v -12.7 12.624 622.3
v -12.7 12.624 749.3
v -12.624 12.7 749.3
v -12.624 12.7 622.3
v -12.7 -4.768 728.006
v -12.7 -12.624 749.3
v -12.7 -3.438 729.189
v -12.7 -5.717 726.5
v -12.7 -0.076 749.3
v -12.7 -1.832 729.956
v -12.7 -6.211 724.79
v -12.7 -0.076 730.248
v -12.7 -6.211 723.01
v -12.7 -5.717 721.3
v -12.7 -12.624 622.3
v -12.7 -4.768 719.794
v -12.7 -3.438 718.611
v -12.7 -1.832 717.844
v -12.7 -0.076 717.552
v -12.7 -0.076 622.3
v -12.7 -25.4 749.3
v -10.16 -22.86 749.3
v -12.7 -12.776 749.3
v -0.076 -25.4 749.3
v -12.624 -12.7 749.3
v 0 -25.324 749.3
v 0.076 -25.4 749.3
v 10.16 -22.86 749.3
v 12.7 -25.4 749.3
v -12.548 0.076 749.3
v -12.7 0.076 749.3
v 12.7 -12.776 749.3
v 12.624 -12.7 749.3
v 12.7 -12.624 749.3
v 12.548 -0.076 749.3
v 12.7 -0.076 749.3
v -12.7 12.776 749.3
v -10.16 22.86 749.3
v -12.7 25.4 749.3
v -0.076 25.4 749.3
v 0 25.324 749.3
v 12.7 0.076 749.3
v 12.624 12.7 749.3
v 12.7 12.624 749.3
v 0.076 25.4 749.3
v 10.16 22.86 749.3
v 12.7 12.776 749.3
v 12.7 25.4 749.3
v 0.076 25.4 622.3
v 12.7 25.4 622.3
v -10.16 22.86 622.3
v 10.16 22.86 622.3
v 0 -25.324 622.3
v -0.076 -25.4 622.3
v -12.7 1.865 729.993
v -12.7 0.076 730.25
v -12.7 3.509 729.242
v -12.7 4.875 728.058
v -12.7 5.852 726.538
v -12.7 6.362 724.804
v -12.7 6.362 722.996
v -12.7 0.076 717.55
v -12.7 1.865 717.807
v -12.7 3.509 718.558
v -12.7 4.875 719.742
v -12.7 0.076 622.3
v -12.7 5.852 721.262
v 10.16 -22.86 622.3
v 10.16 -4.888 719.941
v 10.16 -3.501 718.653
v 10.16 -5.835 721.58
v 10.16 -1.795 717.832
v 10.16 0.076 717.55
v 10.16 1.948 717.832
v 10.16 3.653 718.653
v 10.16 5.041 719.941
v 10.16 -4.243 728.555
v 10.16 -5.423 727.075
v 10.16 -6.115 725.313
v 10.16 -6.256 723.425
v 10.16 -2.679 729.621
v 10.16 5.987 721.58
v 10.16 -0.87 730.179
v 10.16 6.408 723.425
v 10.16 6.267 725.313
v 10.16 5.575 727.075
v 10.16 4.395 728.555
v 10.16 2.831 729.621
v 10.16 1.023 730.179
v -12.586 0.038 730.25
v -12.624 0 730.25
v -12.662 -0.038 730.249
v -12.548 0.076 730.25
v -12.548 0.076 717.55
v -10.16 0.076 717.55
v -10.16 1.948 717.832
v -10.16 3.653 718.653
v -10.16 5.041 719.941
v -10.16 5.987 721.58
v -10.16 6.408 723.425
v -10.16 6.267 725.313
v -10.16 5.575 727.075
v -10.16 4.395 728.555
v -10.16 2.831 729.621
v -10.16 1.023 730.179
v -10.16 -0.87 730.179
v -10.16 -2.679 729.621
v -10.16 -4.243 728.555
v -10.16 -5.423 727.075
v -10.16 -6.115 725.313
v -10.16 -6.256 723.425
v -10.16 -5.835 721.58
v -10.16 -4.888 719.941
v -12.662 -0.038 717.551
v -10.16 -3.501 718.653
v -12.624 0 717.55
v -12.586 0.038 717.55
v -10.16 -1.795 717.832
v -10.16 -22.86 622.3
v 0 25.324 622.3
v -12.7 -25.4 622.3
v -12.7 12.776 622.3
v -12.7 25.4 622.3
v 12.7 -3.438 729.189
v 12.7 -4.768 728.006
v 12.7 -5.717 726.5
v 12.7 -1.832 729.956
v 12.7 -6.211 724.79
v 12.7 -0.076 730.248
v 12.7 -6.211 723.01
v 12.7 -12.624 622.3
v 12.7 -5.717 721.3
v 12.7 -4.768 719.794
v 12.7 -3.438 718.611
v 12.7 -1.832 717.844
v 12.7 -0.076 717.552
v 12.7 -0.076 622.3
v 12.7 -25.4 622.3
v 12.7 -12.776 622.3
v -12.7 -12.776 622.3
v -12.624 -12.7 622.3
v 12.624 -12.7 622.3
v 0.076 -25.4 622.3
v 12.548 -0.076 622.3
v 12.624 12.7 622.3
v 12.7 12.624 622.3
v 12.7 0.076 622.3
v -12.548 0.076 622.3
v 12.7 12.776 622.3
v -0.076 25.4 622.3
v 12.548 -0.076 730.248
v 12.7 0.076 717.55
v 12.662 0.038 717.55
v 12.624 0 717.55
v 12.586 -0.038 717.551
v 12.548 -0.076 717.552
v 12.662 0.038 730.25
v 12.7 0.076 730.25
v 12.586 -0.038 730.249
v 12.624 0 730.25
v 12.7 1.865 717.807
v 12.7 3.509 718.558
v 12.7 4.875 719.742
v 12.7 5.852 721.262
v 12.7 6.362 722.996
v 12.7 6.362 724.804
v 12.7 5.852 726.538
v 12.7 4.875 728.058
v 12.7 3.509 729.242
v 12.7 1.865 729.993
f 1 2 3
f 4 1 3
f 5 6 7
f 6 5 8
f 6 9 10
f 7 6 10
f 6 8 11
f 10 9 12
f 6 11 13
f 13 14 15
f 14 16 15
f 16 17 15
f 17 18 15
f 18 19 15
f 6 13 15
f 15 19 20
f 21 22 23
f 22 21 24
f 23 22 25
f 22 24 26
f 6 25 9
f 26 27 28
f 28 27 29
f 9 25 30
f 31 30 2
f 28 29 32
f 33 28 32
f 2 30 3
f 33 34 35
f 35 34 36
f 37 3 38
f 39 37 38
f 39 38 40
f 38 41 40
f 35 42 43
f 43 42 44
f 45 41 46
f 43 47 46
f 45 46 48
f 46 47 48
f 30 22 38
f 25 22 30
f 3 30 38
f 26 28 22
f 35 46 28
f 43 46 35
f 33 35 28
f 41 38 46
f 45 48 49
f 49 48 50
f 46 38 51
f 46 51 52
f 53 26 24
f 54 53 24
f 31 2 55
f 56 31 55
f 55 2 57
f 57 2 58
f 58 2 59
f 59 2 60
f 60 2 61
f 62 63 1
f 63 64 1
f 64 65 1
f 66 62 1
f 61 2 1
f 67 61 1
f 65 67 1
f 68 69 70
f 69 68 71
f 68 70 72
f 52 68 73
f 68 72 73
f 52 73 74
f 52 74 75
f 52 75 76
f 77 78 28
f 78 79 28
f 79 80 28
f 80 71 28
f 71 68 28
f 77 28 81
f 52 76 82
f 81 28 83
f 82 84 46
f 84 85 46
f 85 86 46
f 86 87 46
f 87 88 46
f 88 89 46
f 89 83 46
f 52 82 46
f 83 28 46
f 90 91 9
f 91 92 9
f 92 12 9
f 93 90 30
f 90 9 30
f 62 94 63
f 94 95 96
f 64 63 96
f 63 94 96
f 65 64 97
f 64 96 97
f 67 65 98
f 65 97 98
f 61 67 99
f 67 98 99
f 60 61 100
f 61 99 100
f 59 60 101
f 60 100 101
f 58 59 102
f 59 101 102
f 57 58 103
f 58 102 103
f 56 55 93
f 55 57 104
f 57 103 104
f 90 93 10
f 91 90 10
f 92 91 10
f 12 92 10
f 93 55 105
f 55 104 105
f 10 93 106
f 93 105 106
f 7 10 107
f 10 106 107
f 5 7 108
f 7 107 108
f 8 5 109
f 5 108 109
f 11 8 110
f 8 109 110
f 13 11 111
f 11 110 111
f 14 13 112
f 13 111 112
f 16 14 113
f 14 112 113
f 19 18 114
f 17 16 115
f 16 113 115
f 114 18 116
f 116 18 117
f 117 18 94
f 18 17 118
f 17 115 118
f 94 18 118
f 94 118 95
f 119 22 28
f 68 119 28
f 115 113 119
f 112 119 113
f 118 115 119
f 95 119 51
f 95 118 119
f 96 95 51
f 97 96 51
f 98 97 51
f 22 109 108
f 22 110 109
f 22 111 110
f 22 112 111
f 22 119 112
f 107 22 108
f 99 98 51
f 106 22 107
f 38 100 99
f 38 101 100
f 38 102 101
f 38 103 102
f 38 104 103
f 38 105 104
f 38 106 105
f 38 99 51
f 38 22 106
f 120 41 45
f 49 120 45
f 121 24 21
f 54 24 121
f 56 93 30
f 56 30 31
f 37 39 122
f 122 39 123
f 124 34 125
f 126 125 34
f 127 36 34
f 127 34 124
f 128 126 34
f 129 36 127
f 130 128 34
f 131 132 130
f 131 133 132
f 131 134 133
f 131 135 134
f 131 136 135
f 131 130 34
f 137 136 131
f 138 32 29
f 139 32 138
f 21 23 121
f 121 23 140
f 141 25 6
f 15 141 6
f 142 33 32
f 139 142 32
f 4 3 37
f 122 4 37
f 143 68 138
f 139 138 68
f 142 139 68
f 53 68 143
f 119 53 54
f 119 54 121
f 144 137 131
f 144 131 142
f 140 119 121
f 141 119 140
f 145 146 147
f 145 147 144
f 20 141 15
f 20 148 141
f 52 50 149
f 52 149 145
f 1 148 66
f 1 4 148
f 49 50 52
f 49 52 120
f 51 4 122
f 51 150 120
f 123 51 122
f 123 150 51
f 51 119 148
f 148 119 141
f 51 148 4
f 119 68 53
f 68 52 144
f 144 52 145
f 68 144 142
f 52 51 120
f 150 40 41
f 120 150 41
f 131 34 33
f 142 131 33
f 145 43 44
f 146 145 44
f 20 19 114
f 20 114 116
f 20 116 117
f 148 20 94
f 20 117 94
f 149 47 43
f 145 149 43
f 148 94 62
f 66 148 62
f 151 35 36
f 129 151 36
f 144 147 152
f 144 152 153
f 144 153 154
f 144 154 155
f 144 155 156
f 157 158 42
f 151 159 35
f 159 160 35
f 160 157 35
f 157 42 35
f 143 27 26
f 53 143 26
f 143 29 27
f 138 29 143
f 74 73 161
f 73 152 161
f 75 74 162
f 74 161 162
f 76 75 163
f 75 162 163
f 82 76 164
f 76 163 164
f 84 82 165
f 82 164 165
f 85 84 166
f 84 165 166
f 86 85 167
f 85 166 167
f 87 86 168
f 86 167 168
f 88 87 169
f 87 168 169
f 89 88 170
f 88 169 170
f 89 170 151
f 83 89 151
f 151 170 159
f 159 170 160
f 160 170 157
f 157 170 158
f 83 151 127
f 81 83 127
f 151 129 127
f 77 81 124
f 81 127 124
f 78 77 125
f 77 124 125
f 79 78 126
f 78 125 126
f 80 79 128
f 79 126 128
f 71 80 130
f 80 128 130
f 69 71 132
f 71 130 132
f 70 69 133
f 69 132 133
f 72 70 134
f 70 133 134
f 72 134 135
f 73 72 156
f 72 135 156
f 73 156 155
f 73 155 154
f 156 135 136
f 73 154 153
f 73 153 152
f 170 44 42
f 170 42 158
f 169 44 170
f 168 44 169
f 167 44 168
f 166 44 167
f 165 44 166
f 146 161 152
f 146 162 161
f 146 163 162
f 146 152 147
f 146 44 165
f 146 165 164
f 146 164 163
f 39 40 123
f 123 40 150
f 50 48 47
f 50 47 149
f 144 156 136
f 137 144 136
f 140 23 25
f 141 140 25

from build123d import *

# Parameters (mm, degrees)
SKETCH1_W           = 1498.6
SKETCH1_H           = 50.8
BOSS_EXTRUDE1_DEPTH = 25.4
CUT_EXTRUDE1_DEPTH  = 1498.6
CUT_EXTRUDE2_DEPTH  = 1499.869043646
CUT_EXTRUDE3_DEPTH  = 1498.6
CUT_EXTRUDE4_DEPTH  = 1498.6
CUT_EXTRUDE5_DEPTH  = 1499.869043646
CUT_EXTRUDE6_DEPTH  = 1499.869043646
CUT_EXTRUDE7_DEPTH  = 1498.6
CUT_EXTRUDE8_DEPTH  = 1498.6
SKETCH10_W          = 20.32
SKETCH10_H          = 45.72
CUT_EXTRUDE9_DEPTH  = 1499.869043646
DRAFT1_ANGLE        = 45
DRAFT2_ANGLE        = 45.000000005
DRAFT3_ANGLE        = 45
DRAFT4_ANGLE        = 45
DRAFT5_ANGLE        = 45
DRAFT6_ANGLE        = 44.999999995
SKETCH11_W          = 61.962293059
SKETCH11_H          = 88.678950317
CUT_EXTRUDE10_DEPTH = 1371.6
SKETCH13_R          = 6.35
CUT_EXTRUDE11_DEPTH = 25.4


with BuildPart() as part:
    # Sketch1 → Boss-Extrude1 (new body)
    with BuildSketch(Plane(origin=(12.7, 0, 0), x_dir=(0, 0, -1), z_dir=(1, 0, 0))):
        Rectangle(SKETCH1_W, SKETCH1_H)
    extrude(amount=-BOSS_EXTRUDE1_DEPTH)

    # Sketch2 → Cut-Extrude1 (cut)
    with BuildSketch(Plane.XY.offset(749.3)):
        Polygon((0.0762, 25.4), (-0.0762, 25.4), (0.0762, 25.2476), align=None)
    extrude(amount=-CUT_EXTRUDE1_DEPTH, mode=Mode.SUBTRACT)

    # Sketch3 → Cut-Extrude2 (cut, through all)
    with BuildSketch(Plane.XY.offset(749.3)):
        Polygon((12.7, 12.6238), (12.7, 12.7762), (12.5476, 12.7762), align=None)
    extrude(amount=-CUT_EXTRUDE2_DEPTH, mode=Mode.SUBTRACT)

    # Sketch4 → Cut-Extrude3 (cut)
    with BuildSketch(Plane.XY.offset(749.3)):
        Polygon((12.7, -0.0762), (12.7, 0.0762), (12.5476, -0.0762), align=None)
    extrude(amount=-CUT_EXTRUDE3_DEPTH, mode=Mode.SUBTRACT)

    # Sketch5 → Cut-Extrude4 (cut)
    with BuildSketch(Plane.XY.offset(749.3)):
        Polygon((12.7, -12.7762), (12.7, -12.6238), (12.5476, -12.6238), align=None)
    extrude(amount=-CUT_EXTRUDE4_DEPTH, mode=Mode.SUBTRACT)

    # Sketch6 → Cut-Extrude5 (cut, through all)
    with BuildSketch(Plane.XY.offset(749.3)):
        Polygon((0.0762, -25.4), (-0.0762, -25.2476), (-0.0762, -25.4), align=None)
    extrude(amount=-CUT_EXTRUDE5_DEPTH, mode=Mode.SUBTRACT)

    # Sketch7 → Cut-Extrude6 (cut, through all)
    with BuildSketch(Plane.XY.offset(749.3)):
        Polygon((-12.7, -12.6238), (-12.7, -12.7762), (-12.5476, -12.7762), align=None)
    extrude(amount=-CUT_EXTRUDE6_DEPTH, mode=Mode.SUBTRACT)

    # Sketch8 → Cut-Extrude7 (cut)
    with BuildSketch(Plane.XY.offset(749.3)):
        Polygon((-12.7, 0.0762), (-12.7, -0.0762), (-12.5476, 0.0762), align=None)
    extrude(amount=-CUT_EXTRUDE7_DEPTH, mode=Mode.SUBTRACT)

    # Sketch9 → Cut-Extrude8 (cut)
    with BuildSketch(Plane.XY.offset(749.3)):
        Polygon((-12.7, 12.7762), (-12.7, 12.6238), (-12.5476, 12.6238), align=None)
    extrude(amount=-CUT_EXTRUDE8_DEPTH, mode=Mode.SUBTRACT)

    # Sketch10 → Cut-Extrude9 (cut, through all)
    with BuildSketch(Plane.XY.offset(749.3)):
        Rectangle(SKETCH10_W, SKETCH10_H)
    extrude(amount=-CUT_EXTRUDE9_DEPTH, mode=Mode.SUBTRACT)

    # Draft1
    draft1_faces = [part.faces().sort_by_distance(p)[0] for p in [
        (0.0762, 25.3238, 0),
    ]]
    draft(draft1_faces, Plane(origin=(-12.7, 25.4, -749.3), x_dir=(0, 0, 1), z_dir=(0, 1, 0)), DRAFT1_ANGLE)

    # Draft2
    draft2_faces = [part.faces().sort_by_distance(p)[0] for p in [
        (12.6238, 12.7762, 0),
    ]]
    draft(draft2_faces, Plane(origin=(12.7, 0, 0), x_dir=(0, 0, 1), z_dir=(1, 0, 0)), DRAFT2_ANGLE)

    # Draft3
    draft3_faces = [part.faces().sort_by_distance(p)[0] for p in [
        (-0.0762, -25.3238, 0),
    ]]
    draft(draft3_faces, Plane(origin=(-12.7, -25.4, 749.3), x_dir=(0, 0, -1), z_dir=(0, -1, 0)), DRAFT3_ANGLE)

    # Draft4
    draft4_faces = [part.faces().sort_by_distance(p)[0] for p in [
        (-12.6238, -12.7762, 0),
    ]]
    draft(draft4_faces, Plane(origin=(-12.7, 0, 0), x_dir=(0, 0, -1), z_dir=(-1, 0, 0)), DRAFT4_ANGLE)

    # Draft5
    draft5_faces = [part.faces().sort_by_distance(p)[0] for p in [
        (12.6238, -12.6238, 0),
        (12.6238, 0, 0),
    ]]
    draft(draft5_faces, Plane(origin=(12.7, 0, 0), x_dir=(0, 0, 1), z_dir=(1, 0, 0)), DRAFT5_ANGLE)

    # Draft6
    draft6_faces = [part.faces().sort_by_distance(p)[0] for p in [
        (-12.6238, 0, 0),
        (-12.6238, 12.6238, 0),
    ]]
    draft(draft6_faces, Plane(origin=(-12.7, 0, 0), x_dir=(0, 0, -1), z_dir=(-1, 0, 0)), DRAFT6_ANGLE)

    # Sketch11 → Cut-Extrude10 (cut)
    with BuildSketch(Plane(origin=(0, 0, -749.3), x_dir=(-1, 0, 0), z_dir=(0, 0, -1))):
        with Locations((-2.92473676, 0.325700182)):
            Rectangle(SKETCH11_W, SKETCH11_H)
    extrude(amount=-CUT_EXTRUDE10_DEPTH, mode=Mode.SUBTRACT)

    # Sketch13 → Cut-Extrude11 (cut)
    with BuildSketch(Plane(origin=(12.7, 0, 0), x_dir=(0, 0, -1), z_dir=(1, 0, 0))):
        with Locations((-723.9, 0.0762)):
            Circle(SKETCH13_R)
    extrude(amount=-CUT_EXTRUDE11_DEPTH, mode=Mode.SUBTRACT)


solid = part.part
